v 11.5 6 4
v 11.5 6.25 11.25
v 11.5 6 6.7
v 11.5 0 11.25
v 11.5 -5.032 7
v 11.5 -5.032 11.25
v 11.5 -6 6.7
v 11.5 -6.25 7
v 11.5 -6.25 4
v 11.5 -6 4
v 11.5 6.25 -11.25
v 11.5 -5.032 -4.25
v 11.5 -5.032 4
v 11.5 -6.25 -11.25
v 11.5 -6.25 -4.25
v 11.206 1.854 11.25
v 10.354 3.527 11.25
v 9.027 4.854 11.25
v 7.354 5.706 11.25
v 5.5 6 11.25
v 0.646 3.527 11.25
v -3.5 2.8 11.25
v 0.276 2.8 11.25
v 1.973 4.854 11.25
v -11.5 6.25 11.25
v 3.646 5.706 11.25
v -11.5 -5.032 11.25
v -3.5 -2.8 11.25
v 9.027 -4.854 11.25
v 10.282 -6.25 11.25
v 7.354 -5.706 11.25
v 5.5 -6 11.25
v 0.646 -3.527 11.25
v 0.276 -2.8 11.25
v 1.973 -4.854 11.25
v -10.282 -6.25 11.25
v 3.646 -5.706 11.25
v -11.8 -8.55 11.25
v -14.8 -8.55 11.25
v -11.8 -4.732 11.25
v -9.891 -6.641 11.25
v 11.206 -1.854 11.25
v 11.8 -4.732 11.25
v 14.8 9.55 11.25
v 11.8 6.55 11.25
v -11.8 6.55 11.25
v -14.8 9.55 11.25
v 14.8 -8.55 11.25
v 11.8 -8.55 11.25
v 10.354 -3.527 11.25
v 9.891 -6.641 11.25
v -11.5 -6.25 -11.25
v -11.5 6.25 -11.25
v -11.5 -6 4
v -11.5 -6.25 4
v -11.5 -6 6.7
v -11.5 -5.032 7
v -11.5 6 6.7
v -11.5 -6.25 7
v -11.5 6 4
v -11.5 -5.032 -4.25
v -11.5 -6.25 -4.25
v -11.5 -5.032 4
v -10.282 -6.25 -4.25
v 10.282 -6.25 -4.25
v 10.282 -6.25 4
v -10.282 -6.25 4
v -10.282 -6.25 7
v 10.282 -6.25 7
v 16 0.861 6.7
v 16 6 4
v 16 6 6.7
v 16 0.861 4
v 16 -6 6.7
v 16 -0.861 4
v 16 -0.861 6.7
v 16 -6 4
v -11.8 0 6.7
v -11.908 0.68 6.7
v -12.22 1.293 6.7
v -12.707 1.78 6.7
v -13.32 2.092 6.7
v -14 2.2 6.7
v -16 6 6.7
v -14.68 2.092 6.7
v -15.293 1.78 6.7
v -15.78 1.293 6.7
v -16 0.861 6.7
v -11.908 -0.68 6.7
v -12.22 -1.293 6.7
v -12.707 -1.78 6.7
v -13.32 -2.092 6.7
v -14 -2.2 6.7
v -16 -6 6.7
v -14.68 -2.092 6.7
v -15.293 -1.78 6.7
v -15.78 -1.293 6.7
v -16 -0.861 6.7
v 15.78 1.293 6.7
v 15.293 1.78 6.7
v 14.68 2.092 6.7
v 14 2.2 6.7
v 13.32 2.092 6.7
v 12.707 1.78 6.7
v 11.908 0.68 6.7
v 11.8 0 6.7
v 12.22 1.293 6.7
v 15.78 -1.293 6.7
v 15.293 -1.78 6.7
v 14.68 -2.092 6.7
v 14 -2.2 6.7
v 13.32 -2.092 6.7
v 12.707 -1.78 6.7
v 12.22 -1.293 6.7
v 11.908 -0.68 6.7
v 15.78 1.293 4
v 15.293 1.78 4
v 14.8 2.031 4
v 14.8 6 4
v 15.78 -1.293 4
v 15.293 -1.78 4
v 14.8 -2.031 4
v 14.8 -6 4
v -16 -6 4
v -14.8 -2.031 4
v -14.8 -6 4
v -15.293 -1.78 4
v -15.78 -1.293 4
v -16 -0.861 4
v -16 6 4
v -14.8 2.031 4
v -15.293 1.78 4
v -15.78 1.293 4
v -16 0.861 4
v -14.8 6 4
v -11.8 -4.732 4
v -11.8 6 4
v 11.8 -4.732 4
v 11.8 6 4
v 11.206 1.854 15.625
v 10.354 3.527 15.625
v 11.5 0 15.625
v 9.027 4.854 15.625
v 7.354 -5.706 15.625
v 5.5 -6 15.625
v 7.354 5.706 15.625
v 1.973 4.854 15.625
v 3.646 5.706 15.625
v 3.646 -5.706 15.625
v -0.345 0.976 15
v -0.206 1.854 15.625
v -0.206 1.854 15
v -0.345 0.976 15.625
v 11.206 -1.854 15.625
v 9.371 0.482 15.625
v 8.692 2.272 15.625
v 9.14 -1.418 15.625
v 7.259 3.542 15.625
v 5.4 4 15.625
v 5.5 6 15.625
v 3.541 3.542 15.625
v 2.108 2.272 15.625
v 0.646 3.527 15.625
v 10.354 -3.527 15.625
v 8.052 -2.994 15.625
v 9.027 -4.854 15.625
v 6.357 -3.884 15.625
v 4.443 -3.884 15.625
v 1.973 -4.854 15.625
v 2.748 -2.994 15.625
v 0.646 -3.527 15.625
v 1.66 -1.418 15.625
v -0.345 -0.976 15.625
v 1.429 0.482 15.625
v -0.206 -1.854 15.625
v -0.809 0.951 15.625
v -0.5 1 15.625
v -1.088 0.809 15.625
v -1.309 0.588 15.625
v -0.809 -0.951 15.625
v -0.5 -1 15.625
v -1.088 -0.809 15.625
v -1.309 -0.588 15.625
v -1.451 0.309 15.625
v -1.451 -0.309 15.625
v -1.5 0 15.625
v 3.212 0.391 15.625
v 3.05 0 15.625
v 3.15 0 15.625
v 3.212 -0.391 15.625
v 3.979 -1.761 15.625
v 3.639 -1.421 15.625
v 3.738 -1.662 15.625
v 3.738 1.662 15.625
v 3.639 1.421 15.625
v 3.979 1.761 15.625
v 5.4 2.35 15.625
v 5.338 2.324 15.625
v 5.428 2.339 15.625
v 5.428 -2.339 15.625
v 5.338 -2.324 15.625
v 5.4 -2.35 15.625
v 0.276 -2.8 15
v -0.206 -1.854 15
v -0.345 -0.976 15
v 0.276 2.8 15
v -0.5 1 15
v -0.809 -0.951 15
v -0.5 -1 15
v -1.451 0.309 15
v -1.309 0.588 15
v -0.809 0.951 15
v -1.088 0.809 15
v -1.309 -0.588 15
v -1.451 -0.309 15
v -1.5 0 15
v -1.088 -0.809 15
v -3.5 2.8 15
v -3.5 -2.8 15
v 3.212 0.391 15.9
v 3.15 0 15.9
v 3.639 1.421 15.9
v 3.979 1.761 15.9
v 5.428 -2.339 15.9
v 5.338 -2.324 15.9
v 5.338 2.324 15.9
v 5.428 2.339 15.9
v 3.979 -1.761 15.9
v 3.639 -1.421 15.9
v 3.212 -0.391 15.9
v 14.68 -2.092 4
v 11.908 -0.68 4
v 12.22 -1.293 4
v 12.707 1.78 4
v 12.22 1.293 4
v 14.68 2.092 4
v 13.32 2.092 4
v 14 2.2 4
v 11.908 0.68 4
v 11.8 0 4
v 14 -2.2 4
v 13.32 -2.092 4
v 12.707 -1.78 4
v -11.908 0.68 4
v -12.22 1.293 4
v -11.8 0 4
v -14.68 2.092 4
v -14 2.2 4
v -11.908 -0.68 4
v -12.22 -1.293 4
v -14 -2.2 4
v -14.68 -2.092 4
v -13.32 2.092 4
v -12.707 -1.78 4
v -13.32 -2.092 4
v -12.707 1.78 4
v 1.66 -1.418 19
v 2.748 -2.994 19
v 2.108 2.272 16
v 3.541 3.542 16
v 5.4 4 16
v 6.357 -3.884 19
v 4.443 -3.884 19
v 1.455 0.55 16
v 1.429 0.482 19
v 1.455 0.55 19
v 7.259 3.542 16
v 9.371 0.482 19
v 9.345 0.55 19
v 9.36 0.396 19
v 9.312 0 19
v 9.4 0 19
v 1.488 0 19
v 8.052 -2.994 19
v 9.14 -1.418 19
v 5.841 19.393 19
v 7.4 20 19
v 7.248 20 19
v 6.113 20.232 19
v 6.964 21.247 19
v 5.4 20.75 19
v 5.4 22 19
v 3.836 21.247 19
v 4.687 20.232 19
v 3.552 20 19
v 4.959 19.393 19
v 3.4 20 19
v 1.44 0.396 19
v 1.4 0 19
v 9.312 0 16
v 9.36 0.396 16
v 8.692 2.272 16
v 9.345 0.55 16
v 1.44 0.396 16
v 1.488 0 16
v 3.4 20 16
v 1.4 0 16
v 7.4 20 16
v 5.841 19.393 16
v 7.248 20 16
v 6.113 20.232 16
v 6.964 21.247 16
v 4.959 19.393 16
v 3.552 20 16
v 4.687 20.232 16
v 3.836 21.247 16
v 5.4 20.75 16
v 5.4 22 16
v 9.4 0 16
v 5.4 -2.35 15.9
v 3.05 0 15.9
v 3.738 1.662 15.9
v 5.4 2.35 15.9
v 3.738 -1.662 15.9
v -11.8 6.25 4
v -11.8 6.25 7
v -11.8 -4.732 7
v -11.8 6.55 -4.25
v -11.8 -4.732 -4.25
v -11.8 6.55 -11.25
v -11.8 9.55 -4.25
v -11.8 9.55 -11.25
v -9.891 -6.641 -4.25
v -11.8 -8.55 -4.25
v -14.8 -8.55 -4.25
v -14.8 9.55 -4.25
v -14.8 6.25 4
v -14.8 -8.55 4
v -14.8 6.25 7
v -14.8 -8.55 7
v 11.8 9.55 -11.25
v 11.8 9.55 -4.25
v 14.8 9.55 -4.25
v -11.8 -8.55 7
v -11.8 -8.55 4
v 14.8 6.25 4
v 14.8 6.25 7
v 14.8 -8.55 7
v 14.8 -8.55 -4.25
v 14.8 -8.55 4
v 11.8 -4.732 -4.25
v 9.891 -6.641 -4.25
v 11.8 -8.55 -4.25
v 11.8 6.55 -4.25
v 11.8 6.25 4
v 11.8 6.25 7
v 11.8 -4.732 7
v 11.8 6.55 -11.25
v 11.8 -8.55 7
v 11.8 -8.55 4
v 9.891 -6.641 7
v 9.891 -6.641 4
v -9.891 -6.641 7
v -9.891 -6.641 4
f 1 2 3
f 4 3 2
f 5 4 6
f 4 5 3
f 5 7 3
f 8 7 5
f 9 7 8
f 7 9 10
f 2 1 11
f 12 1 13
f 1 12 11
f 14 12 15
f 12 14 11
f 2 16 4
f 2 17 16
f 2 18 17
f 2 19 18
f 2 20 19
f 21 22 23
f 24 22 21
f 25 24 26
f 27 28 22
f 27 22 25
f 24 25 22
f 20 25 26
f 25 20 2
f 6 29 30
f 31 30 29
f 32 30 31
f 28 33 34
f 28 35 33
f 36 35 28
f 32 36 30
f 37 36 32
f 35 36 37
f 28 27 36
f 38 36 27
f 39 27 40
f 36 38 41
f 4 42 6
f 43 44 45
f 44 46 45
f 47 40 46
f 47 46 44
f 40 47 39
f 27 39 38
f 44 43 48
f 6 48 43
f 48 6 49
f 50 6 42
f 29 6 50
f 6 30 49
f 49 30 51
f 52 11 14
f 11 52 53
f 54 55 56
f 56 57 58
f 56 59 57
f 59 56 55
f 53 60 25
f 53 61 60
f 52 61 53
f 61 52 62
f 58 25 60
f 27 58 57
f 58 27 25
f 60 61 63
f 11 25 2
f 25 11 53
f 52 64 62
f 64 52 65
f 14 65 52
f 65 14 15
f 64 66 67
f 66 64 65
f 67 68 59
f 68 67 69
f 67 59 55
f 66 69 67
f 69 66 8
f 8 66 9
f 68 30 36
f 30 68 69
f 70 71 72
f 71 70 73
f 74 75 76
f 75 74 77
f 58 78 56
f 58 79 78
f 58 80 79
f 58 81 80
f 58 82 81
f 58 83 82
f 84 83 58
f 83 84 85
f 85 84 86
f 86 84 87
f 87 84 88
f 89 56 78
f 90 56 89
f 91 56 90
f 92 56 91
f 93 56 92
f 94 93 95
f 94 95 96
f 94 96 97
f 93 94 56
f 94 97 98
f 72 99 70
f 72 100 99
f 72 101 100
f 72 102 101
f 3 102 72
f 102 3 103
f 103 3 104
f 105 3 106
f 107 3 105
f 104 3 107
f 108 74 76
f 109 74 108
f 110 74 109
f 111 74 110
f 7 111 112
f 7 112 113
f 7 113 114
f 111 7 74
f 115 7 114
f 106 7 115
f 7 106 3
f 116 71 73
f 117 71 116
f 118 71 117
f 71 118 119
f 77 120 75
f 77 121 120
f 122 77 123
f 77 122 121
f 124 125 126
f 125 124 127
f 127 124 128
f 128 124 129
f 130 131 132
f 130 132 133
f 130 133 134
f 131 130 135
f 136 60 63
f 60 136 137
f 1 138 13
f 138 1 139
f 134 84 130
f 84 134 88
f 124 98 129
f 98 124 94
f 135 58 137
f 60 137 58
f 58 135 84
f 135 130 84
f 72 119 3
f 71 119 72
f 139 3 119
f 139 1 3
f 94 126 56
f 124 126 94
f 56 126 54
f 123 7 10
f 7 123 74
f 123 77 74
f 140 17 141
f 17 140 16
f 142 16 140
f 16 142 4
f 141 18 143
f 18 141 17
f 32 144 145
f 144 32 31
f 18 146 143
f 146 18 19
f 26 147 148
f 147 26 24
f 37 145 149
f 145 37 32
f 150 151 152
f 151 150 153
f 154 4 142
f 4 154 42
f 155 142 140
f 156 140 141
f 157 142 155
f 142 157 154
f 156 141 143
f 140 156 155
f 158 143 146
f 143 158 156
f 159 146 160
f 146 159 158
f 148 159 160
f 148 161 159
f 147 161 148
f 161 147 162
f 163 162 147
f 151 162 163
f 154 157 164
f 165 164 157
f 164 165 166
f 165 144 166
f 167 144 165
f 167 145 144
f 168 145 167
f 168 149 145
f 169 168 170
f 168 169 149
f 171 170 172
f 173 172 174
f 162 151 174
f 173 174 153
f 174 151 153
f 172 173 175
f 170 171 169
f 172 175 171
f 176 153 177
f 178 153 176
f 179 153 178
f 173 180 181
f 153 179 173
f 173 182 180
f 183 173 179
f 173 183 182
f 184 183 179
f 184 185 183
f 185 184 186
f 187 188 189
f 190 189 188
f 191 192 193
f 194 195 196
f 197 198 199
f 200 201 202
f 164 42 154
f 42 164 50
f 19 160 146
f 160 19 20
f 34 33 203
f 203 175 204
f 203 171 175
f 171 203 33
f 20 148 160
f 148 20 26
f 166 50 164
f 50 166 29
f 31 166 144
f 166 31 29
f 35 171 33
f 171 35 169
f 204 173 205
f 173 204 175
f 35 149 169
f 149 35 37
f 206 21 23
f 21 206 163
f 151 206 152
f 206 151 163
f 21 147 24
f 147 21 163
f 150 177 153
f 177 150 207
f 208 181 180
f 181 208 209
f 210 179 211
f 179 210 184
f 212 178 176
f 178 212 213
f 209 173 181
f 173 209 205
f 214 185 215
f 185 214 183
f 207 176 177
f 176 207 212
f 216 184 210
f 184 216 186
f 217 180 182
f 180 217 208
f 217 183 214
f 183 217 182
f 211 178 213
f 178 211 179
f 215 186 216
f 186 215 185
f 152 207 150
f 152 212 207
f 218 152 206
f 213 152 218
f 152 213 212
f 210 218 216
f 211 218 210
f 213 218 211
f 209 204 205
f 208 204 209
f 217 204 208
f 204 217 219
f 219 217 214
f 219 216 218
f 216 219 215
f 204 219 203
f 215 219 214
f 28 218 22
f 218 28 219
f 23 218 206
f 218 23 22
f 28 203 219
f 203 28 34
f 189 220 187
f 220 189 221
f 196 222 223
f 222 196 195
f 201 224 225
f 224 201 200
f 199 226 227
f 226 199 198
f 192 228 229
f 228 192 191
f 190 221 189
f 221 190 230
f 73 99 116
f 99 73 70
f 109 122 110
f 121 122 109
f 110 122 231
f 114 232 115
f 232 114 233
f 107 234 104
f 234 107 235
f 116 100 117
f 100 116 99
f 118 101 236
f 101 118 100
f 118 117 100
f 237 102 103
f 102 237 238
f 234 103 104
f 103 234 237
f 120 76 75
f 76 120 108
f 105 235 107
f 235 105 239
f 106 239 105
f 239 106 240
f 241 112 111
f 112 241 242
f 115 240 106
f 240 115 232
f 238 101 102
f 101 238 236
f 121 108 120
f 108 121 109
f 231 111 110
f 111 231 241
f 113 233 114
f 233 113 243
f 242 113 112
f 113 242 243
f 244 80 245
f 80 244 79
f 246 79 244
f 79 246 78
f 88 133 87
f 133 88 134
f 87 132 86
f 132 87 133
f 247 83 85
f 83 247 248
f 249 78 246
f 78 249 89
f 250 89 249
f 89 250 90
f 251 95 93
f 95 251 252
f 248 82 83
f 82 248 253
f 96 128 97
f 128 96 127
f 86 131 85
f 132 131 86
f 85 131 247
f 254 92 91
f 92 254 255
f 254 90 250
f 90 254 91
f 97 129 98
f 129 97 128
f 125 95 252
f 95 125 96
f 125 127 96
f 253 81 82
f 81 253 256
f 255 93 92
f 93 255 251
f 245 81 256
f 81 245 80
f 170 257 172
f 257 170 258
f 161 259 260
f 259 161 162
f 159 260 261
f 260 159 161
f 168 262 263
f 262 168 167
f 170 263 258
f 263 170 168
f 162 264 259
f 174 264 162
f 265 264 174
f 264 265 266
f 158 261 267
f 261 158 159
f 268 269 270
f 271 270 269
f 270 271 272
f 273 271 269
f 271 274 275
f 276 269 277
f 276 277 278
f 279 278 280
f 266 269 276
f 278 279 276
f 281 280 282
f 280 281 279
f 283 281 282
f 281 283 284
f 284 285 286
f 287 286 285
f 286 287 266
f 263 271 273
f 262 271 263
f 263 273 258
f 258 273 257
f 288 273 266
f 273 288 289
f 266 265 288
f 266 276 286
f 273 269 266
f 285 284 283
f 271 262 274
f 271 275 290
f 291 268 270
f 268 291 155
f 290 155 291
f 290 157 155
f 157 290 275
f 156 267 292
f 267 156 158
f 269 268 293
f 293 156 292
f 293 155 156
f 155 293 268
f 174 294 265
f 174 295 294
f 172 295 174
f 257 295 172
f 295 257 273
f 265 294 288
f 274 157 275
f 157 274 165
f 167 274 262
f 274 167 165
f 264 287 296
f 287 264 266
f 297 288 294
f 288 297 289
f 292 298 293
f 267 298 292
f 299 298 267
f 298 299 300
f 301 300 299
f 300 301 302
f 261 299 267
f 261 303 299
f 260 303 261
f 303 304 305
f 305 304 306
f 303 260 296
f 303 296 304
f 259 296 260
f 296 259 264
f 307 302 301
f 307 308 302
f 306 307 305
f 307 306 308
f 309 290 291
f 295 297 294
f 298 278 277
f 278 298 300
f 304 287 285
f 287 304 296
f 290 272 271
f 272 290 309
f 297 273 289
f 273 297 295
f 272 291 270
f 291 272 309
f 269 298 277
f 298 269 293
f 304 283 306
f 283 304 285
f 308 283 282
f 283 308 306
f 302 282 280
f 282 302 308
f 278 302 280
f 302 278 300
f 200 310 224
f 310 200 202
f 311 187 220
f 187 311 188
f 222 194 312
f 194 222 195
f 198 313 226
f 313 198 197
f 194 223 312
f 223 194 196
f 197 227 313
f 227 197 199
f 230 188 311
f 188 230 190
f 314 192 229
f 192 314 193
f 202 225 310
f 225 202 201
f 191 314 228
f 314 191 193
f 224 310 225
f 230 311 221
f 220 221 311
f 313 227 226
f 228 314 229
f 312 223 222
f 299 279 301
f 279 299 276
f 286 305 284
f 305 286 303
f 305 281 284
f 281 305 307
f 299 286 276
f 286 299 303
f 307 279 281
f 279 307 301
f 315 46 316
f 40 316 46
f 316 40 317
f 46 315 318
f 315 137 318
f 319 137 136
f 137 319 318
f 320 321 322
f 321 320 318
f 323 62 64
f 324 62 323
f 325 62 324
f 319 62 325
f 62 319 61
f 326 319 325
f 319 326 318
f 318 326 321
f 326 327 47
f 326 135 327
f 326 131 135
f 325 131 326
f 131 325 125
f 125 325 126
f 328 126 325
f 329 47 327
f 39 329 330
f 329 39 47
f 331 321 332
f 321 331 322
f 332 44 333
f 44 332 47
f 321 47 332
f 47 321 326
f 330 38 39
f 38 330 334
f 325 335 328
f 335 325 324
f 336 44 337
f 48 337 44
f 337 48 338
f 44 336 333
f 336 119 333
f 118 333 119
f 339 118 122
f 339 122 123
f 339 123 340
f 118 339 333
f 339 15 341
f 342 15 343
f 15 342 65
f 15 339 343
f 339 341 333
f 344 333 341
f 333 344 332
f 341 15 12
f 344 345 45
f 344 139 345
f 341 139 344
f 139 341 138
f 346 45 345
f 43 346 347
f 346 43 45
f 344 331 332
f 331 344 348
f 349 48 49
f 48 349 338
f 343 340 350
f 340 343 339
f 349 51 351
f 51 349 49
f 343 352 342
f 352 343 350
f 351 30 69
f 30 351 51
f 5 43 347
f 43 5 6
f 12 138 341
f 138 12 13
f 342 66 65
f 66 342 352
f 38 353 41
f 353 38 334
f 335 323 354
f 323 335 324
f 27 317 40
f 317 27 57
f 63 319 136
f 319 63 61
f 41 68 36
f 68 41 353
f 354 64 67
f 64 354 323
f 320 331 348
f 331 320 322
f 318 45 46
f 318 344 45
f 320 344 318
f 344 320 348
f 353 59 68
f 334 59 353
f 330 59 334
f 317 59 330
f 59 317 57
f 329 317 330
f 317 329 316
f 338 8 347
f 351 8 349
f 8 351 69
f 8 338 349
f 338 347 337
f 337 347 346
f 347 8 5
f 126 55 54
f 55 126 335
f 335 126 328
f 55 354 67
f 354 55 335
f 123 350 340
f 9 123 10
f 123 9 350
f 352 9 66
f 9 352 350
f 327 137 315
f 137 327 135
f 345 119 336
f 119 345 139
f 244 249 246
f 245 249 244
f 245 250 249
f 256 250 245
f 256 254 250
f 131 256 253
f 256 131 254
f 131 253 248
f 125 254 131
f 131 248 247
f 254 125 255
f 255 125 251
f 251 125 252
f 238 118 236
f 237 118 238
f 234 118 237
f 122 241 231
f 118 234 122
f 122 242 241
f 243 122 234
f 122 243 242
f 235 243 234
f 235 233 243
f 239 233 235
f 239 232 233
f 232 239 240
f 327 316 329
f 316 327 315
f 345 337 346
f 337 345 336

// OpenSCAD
drehachseR = 2.35;
servoX = 23;
servoY = 12.5;
servoZ = 22.5;

offsetBefestigungZ=4;   // wie weit ist die Unterkante der Befestigungsplatte von der Mittelachse entfernt
befestigungZ = 2.7;

module motor9g(){
	difference(){			
		union(){
			color("Gray") cube([servoX,servoY,servoZ], center=true);
			befestigungZ = 2.7;
            color("Gray") translate([0,0,offsetBefestigungZ+befestigungZ/2])
                cube([32,12,befestigungZ], center=true);
			color("Gray") translate([5.5,0,2.75]) cylinder(r=6, h=25.75, $fn=20, center=true);
			color("Gray") translate([-.5,0,2.75]) cylinder(r=1, h=25.75, $fn=20, center=true);
			color("Gray") translate([-1,0,2.75]) cube([5,5.6,24.5], center=true);		
			color("white") translate([5.5,0,3.65]) cylinder(r=2.35, h=29.25, $fn=20, center=true);
		}
		// die Abschrägung gibt es nicht immer
        //translate([10,0,-11]) rotate([0,-30,0]) cube([8,13,4], center=true);
		for ( hole = [14,-14] ){
			translate([hole,0,5]) cylinder(r=2.2, h=4, $fn=20, center=true);
		}	
	}
}

module arm9g(laenge,winkel){
    dicke = 3;
    rAchse = 4;
    rEnde = 2;
    #translate([5.4,0,16])rotate([0,0,winkel]){
        difference(){
            union(){
                translate([0,0,-2]) cylinder(r=rAchse, h=dicke+2);
                linear_extrude(height = dicke, convexity = 10)
                    polygon(points=[[0,rAchse],[0,-rAchse],[laenge,rEnde],[laenge,-rEnde]]
                        , paths=[[0,1,3,2]]);
                translate([laenge,0,0]) cylinder(r=rEnde, h=dicke);
            }
            // die Achse
            translate([0,0,-2.1]) cylinder(r=drehachseR, h=2);
            // das Loch zur Befestigung der Hebelstange
            translate([laenge,0,-.1]) cylinder(d=1.5, h=dicke+.2);
        }
    }
}

module holder9g(){
    luft = .3;
    dicke = 3;
    hoehe = servoZ; // der Halter ist so hoch wie das Servo
    naseY = 3.3;    // soll etwas unter Spannung sein, war 3.5
    difference(){
        union(){
            // lange Seite
            translate([-servoX/2-luft,servoY/2+luft,servoZ/2-hoehe])
                cube([servoX+2*luft,dicke,hoehe]);
            // kurze Seiten
            seiteY = servoY+dicke+luft+naseY-1; // jetzt 1mm kürzer
            hoeheS=hoehe-7; //die Federklammern sind auf der ganzen Höhe zu fest.
                            //das Kabel muss auch raus geführt werden
            for(x=[-servoX/2-dicke-luft, servoX/2+luft]){
                translate([x,-servoY/2-naseY+1,servoZ/2-hoeheS]) cube([dicke,seiteY,hoeheS]);
            }
            // die Haltenasen
            dicke2=dicke*.9;   // war 1.1
            for(x=[servoX/2+luft,-servoX/2-luft]){
                //Y jetzt 1mm kuerzer (+1)
                translate([x,-servoY/2-naseY+1,servoZ/2-hoeheS])
                    rotate([0,0,45]) cube([dicke2,dicke2,hoeheS]);
            }
        }
        // der Schlitz für die Befestigung
        schlitzZ = befestigungZ+luft;
        schlitzY = servoY+naseY+.1;
        gesamtX = servoX+2*luft+2*dicke;
        gesamtY = dicke+luft+servoY+naseY;
        translate([-gesamtX/2-.1,-schlitzY+servoY/2,offsetBefestigungZ])
            cube([gesamtX+.2,schlitzY,schlitzZ]);
    }
}

motor9g();
arm9g(laenge=20,winkel=90);
holder9g();
